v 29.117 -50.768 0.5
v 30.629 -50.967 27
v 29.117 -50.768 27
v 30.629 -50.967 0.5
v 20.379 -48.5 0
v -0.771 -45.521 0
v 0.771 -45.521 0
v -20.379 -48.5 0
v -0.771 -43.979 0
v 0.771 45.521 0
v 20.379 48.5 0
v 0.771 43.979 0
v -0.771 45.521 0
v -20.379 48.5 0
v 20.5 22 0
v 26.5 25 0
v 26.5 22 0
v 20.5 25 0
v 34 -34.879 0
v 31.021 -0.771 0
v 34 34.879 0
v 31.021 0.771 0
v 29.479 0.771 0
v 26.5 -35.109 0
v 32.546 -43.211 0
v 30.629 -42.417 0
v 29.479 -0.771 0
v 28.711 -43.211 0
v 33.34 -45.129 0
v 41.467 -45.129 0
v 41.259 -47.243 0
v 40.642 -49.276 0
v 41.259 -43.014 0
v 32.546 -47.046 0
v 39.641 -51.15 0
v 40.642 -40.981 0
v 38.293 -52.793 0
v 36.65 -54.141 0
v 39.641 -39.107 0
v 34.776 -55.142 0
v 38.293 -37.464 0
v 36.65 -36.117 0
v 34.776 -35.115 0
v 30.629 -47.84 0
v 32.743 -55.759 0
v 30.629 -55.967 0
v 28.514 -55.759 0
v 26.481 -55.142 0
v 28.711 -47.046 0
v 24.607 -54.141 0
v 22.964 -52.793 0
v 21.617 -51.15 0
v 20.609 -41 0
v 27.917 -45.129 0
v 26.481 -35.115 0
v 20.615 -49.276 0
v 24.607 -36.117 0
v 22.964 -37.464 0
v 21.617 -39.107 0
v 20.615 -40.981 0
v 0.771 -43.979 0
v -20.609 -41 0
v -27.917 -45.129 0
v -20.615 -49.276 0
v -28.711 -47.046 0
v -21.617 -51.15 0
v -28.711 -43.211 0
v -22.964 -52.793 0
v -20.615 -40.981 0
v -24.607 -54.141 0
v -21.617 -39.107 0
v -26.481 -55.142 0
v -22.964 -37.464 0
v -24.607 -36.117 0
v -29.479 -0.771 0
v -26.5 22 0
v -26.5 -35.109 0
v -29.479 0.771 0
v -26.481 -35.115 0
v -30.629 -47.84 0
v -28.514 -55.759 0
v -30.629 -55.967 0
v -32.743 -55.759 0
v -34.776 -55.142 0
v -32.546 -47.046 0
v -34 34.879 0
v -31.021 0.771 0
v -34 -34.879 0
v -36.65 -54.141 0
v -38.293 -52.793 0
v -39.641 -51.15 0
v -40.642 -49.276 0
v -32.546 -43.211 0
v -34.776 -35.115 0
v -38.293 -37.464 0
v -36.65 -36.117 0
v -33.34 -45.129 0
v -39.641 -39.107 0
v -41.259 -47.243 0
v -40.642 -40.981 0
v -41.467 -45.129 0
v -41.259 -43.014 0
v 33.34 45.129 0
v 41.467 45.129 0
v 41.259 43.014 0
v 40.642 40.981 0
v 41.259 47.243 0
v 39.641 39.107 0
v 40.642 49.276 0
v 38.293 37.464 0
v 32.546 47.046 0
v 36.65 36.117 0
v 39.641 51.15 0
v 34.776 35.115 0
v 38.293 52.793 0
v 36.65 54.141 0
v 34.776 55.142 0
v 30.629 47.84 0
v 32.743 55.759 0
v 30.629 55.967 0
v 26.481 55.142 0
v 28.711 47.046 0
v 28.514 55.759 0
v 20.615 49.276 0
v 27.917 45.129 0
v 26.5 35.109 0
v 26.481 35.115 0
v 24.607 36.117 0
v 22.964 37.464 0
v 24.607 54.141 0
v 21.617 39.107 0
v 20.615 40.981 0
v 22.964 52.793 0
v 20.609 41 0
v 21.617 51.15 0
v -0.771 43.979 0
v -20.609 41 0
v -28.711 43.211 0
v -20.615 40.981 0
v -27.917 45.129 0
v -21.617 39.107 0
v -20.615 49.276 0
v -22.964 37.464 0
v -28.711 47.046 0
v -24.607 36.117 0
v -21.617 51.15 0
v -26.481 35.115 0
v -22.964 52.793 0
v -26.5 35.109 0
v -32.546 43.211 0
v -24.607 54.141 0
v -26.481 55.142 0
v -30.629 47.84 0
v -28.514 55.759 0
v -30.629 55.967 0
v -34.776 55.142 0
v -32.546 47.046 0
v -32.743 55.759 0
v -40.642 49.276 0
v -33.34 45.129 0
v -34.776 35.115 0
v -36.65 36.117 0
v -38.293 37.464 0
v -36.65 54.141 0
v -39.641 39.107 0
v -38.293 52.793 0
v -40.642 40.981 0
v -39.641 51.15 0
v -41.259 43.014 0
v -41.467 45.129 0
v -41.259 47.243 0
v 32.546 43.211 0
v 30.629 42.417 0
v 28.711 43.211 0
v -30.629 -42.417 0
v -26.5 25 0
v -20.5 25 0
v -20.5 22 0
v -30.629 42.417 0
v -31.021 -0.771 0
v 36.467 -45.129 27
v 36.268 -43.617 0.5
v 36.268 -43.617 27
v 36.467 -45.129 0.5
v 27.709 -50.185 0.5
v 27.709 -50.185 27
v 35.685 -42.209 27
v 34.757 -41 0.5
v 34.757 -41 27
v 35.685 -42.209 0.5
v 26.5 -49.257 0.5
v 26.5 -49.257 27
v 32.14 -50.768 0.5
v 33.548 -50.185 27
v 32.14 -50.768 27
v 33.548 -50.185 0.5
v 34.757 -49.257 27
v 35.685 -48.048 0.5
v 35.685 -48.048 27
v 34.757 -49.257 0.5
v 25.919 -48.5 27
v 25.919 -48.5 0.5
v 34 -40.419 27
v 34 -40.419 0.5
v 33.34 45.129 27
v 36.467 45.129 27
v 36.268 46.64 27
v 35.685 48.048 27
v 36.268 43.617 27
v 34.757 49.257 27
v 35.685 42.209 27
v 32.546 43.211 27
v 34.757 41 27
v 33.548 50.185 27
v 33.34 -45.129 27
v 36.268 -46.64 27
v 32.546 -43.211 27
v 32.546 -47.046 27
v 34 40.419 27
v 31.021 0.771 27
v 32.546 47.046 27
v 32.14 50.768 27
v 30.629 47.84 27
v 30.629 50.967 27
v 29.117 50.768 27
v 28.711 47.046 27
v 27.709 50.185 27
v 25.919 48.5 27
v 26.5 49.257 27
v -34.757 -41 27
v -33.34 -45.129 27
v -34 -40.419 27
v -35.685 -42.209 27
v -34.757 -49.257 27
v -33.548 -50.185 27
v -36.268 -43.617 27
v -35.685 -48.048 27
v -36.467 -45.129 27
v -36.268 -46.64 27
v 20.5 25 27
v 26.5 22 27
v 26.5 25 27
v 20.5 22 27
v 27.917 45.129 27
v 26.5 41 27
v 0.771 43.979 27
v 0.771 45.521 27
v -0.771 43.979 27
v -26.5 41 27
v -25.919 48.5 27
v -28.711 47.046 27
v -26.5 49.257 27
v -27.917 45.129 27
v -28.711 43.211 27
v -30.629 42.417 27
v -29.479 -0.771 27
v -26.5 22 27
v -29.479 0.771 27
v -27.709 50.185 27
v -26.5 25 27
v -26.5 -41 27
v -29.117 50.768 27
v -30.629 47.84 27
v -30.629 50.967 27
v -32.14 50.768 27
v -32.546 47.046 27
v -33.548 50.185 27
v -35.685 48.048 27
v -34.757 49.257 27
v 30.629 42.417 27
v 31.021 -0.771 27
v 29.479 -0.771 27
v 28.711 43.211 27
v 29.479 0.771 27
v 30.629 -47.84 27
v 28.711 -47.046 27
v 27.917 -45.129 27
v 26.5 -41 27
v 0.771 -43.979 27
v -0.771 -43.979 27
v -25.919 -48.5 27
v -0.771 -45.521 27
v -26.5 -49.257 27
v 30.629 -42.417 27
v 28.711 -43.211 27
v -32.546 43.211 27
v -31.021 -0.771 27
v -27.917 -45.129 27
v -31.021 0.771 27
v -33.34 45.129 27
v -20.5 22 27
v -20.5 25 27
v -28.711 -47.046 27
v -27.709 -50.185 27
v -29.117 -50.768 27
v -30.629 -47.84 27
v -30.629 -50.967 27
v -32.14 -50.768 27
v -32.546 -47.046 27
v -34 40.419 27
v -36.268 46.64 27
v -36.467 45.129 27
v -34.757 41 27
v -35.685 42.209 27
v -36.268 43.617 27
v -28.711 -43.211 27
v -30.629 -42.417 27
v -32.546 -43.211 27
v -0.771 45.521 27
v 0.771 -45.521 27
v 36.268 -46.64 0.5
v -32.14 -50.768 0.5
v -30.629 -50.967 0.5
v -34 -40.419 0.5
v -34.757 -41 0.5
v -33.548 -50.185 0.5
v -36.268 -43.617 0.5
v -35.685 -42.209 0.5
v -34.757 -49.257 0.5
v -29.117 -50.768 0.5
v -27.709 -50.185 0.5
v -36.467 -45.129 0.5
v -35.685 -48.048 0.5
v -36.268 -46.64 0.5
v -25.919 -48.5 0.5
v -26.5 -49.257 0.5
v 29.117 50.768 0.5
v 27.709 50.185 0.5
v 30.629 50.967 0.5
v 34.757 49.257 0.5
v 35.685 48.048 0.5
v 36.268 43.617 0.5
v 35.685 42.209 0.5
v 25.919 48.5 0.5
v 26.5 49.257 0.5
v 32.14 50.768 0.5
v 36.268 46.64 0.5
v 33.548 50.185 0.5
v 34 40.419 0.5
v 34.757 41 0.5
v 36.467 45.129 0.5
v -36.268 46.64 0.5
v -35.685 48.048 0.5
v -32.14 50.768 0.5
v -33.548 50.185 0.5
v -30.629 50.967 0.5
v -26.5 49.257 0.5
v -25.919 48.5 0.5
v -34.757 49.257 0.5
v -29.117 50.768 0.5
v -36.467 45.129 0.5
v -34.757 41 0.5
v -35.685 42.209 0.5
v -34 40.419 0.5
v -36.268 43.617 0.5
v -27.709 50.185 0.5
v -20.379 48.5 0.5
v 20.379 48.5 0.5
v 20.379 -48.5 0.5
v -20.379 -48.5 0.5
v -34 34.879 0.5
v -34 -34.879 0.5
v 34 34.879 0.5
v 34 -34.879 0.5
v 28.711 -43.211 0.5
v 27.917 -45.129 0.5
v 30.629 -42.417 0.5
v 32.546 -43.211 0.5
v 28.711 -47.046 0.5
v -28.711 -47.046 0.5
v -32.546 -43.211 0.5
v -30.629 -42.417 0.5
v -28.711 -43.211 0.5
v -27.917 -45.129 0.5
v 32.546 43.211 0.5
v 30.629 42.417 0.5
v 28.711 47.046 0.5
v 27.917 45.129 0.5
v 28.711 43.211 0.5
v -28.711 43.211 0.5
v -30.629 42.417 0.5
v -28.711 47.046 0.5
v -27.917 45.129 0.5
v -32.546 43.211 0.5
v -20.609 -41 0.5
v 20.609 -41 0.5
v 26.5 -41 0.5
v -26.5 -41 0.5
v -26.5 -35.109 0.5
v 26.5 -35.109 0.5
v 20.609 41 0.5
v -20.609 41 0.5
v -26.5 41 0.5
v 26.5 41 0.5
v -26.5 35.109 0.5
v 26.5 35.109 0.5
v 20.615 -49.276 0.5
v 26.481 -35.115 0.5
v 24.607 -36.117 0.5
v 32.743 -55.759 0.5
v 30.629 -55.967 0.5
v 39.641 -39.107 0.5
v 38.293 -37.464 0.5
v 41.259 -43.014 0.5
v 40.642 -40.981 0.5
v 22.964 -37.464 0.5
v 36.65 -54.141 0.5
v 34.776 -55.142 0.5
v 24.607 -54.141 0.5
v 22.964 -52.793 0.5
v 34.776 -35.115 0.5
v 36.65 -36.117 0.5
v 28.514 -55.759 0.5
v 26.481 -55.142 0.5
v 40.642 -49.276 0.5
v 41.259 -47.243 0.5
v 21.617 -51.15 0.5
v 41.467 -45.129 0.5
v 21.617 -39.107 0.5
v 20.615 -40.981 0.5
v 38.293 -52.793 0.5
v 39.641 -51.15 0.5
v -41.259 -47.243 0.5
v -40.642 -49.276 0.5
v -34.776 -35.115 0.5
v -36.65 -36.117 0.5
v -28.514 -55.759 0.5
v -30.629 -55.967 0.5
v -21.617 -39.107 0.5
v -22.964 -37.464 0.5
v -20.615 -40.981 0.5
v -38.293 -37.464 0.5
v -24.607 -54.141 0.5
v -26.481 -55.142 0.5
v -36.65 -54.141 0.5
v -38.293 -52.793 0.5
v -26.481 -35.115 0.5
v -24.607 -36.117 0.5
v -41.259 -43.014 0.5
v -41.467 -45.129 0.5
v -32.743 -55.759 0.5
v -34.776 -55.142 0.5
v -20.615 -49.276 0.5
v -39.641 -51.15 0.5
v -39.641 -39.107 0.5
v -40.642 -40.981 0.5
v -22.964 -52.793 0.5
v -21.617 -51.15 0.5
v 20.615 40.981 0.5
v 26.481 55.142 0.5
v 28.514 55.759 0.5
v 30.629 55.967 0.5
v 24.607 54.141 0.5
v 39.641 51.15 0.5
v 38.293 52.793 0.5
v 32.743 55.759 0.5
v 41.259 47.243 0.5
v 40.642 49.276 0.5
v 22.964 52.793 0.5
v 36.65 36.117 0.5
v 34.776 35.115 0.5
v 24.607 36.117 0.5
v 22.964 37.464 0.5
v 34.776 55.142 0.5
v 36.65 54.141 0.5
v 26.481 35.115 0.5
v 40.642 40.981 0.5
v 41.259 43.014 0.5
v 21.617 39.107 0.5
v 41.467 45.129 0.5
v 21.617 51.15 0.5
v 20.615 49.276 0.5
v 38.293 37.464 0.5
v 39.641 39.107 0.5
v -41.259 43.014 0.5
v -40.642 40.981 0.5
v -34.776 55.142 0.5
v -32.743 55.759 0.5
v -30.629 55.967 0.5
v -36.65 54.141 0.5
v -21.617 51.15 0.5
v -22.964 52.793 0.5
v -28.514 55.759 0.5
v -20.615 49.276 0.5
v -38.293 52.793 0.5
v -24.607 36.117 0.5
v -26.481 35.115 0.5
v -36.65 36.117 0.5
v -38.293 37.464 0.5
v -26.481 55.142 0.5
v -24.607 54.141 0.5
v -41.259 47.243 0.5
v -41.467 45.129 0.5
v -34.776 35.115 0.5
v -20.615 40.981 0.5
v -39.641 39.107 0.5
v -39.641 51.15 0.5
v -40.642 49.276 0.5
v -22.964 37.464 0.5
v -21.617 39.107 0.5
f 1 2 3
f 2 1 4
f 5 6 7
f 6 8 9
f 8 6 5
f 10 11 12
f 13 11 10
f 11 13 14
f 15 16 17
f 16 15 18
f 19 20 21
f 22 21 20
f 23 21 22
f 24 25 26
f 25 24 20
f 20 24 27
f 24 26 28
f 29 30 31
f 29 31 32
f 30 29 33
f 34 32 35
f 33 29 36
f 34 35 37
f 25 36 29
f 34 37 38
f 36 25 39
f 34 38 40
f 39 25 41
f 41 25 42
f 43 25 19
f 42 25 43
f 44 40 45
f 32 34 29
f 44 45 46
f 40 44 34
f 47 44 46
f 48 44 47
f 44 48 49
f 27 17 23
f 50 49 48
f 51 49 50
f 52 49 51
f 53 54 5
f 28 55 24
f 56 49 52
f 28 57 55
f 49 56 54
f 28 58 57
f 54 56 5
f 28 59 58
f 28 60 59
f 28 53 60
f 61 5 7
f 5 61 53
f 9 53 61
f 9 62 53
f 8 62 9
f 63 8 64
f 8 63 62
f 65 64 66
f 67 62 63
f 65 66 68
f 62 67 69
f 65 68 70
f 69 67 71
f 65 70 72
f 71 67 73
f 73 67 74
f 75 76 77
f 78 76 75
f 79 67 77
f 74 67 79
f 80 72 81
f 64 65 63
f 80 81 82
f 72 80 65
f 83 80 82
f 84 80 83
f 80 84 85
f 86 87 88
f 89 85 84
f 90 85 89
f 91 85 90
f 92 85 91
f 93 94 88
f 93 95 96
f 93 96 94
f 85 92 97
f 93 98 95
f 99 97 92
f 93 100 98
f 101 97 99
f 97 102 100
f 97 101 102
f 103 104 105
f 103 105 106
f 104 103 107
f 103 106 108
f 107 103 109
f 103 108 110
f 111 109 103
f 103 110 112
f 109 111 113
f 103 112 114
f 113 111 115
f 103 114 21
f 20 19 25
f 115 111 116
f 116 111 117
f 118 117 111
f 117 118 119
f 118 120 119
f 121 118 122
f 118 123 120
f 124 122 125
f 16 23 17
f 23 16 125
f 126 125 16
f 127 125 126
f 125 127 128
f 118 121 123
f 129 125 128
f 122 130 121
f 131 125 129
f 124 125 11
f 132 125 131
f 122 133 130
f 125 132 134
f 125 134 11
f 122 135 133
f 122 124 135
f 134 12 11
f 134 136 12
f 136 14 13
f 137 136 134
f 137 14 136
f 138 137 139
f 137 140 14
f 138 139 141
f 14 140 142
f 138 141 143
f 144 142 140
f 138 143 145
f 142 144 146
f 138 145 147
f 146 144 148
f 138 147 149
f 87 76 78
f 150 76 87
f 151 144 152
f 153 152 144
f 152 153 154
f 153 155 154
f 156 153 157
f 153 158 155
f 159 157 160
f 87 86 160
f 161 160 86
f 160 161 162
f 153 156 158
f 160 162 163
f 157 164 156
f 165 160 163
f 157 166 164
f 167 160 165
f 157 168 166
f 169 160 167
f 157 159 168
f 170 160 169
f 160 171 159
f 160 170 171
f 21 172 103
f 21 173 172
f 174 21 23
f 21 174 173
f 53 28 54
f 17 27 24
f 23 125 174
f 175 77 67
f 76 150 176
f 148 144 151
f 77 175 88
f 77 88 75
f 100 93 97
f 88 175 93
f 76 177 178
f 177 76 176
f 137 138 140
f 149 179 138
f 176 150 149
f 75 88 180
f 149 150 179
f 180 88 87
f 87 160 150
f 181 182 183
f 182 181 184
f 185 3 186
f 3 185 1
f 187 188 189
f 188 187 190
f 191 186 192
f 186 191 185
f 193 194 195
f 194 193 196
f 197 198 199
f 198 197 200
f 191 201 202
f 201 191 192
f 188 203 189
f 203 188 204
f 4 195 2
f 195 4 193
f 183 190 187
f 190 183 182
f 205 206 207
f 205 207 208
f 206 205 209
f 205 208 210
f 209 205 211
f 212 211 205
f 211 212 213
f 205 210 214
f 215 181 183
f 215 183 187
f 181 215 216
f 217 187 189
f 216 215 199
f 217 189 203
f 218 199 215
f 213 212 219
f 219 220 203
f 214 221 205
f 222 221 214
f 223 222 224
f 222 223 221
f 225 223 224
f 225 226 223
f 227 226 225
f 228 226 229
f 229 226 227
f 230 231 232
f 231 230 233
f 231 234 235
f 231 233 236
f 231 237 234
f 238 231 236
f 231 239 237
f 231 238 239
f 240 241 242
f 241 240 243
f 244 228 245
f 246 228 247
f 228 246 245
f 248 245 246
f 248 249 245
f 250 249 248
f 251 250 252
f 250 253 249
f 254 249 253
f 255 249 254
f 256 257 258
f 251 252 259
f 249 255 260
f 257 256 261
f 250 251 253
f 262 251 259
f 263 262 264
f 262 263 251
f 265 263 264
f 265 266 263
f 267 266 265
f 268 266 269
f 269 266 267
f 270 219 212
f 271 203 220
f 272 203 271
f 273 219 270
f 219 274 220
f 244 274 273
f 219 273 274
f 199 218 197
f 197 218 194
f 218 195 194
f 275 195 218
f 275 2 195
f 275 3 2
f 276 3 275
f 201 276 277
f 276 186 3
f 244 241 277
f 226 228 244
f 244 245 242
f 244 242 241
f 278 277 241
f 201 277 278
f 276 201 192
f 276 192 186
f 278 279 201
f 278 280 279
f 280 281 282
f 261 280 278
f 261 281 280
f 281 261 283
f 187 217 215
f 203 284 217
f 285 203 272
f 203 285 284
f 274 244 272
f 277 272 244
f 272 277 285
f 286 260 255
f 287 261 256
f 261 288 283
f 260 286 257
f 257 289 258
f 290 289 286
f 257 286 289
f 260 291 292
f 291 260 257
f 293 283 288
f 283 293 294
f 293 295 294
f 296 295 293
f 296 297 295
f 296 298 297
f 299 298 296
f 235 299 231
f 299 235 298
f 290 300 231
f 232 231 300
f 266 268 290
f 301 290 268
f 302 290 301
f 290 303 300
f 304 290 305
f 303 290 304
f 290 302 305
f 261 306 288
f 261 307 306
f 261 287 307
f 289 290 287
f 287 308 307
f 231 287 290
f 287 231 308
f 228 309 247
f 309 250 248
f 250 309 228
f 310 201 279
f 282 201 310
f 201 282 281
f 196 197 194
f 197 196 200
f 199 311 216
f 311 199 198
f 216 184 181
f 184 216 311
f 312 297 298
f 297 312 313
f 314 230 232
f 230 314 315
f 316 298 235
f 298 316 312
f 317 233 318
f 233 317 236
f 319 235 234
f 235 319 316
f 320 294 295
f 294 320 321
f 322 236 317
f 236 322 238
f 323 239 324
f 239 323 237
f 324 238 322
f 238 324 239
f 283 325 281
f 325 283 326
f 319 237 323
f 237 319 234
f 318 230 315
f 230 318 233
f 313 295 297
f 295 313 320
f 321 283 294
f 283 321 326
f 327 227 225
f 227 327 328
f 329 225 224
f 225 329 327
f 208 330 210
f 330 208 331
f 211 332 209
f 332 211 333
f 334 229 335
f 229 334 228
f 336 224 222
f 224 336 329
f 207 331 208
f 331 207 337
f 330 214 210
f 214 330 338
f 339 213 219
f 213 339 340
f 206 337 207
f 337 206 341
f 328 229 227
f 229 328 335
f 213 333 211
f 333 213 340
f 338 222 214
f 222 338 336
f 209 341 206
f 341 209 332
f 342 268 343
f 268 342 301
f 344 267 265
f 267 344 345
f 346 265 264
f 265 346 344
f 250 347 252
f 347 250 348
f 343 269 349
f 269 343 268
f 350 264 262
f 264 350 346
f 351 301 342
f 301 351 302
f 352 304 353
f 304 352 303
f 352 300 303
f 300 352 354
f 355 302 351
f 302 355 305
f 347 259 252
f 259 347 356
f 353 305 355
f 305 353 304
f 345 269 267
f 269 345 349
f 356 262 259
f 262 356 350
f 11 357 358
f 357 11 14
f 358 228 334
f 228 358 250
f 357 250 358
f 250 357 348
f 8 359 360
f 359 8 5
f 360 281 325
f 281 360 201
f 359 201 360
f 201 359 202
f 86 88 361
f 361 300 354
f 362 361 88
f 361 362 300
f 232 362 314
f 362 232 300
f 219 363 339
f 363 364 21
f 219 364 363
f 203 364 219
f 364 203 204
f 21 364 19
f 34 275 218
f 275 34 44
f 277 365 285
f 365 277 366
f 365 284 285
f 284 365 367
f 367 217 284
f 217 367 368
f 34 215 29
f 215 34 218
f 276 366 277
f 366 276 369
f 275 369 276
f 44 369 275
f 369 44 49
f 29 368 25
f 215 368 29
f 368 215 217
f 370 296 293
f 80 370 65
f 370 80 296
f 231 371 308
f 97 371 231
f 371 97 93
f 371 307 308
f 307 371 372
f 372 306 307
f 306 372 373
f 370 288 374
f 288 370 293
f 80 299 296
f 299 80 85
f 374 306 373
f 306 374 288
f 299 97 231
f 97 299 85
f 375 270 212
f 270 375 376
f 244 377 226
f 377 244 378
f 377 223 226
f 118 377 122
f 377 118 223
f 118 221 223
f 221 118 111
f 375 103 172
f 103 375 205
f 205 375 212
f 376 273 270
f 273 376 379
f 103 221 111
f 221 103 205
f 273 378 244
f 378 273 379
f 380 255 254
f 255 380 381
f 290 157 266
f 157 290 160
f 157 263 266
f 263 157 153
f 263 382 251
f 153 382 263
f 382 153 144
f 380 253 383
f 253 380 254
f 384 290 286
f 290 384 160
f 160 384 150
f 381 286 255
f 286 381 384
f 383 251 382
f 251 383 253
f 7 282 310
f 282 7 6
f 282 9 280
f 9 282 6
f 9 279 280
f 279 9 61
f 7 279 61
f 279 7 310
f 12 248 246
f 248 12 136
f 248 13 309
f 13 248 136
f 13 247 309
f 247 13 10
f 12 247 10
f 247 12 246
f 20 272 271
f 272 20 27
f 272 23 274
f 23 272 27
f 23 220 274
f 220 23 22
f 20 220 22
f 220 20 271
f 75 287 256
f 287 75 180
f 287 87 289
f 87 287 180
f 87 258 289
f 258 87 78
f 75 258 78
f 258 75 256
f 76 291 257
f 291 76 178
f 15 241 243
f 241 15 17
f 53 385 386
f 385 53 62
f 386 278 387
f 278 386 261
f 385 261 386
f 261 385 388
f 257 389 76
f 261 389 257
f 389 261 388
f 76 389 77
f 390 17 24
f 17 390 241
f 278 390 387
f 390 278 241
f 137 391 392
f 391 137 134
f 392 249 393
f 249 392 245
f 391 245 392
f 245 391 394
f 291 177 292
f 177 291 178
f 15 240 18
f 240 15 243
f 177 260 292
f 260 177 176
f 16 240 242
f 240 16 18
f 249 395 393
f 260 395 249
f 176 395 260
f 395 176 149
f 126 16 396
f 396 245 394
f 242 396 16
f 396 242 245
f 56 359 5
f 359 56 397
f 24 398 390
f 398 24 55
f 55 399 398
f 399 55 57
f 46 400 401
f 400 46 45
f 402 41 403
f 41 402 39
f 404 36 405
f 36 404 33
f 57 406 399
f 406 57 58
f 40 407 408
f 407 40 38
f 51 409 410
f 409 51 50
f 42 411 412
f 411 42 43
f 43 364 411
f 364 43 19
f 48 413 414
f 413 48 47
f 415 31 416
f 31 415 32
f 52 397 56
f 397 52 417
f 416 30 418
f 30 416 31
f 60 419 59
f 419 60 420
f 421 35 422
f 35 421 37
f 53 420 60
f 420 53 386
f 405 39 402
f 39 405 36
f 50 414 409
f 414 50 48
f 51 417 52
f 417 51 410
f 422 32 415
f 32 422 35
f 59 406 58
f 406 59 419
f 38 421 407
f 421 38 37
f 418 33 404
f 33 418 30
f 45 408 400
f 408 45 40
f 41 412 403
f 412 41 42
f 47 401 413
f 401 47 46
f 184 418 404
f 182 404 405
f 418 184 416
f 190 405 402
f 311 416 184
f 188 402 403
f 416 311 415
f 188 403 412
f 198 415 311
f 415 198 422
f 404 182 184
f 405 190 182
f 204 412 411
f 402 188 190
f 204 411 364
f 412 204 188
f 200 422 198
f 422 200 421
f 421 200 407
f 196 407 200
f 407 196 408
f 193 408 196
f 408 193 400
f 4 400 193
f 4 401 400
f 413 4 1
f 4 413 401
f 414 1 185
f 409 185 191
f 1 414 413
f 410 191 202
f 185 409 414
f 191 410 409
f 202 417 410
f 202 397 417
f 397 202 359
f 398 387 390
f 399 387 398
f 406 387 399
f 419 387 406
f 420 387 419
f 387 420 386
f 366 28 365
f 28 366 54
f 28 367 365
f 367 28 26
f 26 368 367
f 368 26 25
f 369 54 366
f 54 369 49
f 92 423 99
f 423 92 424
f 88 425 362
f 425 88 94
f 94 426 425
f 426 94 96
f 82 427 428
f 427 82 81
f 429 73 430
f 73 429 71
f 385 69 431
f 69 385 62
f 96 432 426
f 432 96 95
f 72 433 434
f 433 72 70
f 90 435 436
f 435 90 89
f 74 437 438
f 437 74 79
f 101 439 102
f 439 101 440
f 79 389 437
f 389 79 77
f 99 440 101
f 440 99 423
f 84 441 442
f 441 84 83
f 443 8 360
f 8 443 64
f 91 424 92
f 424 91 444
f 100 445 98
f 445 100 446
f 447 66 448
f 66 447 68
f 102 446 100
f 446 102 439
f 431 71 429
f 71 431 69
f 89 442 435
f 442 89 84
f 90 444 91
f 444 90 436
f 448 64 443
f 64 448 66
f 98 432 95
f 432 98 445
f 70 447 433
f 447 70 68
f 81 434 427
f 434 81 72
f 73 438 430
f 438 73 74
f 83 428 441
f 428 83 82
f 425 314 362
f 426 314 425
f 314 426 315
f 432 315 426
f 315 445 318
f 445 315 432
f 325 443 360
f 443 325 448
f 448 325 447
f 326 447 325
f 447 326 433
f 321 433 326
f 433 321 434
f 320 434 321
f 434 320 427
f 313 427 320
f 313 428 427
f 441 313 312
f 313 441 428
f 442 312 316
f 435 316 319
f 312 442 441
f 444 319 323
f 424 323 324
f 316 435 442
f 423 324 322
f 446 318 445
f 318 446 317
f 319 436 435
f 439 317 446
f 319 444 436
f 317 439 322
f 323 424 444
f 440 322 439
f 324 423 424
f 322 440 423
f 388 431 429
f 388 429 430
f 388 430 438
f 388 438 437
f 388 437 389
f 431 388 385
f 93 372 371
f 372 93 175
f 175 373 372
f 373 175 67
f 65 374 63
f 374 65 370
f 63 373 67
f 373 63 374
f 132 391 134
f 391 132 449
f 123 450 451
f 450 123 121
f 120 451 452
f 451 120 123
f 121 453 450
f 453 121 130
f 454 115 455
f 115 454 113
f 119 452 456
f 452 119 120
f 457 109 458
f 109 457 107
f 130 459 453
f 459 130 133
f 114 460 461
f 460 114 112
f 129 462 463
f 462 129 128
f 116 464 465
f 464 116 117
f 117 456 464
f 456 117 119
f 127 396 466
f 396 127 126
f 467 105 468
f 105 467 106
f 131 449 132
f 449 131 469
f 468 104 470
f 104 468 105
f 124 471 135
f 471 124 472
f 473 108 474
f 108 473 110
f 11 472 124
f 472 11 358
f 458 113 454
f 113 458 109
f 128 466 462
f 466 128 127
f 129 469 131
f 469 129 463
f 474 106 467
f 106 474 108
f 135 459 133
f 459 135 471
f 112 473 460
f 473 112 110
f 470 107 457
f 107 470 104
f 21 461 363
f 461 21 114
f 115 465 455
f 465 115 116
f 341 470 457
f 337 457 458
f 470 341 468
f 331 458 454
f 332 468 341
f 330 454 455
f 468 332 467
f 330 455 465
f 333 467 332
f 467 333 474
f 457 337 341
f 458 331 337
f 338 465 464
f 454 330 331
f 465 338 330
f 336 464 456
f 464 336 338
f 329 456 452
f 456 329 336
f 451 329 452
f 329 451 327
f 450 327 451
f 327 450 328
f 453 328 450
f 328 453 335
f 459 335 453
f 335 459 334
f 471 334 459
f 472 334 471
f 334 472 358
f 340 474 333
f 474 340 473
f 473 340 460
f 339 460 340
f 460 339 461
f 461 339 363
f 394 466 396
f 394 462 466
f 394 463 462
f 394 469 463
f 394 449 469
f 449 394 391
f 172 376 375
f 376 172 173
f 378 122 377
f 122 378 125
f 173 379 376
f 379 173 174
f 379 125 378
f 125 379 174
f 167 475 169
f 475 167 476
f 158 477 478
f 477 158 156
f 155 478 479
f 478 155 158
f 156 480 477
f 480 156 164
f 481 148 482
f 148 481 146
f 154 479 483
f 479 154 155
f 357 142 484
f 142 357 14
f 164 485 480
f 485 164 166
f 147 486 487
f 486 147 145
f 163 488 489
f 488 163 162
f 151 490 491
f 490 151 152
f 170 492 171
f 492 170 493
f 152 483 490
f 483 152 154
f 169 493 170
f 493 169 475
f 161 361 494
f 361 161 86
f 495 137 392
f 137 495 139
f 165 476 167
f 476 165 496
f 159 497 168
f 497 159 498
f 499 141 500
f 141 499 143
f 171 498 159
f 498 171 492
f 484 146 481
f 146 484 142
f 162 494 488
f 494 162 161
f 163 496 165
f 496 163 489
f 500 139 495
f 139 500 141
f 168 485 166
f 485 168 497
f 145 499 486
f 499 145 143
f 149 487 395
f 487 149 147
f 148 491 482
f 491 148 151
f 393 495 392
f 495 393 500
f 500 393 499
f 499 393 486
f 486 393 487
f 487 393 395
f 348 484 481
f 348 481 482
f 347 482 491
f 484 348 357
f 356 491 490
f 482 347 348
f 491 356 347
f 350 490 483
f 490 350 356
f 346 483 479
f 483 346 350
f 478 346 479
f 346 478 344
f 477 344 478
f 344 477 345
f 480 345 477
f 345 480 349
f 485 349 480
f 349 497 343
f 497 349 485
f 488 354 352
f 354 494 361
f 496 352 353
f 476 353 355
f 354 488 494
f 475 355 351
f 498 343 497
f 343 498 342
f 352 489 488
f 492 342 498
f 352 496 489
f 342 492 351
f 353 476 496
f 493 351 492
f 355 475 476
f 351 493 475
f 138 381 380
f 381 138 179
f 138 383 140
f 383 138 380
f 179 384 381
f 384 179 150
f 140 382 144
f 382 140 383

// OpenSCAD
// Longboard Ground Effect Lighting Controller Case
// Ed Nisley KE4ZNU
// Karen Nisley KC2SYU
// October 2012

// Layout options

Layout = "Build1";
					// Overall layout: Fit Show
					// Printing plates: Build1 .. Buildn (see bottom!)
					// Parts: BatteryLayer PCBLayer1 PCBLayer2
					// Shapes: CaseShell PCBEnvelope

ShowGap = 5;		// spacing between parts in Show layout

//-----
// Extrusion parameters must match reality!

ThreadThick = 0.25;
ThreadWidth = 2.0 * ThreadThick;

HoleWindage = 0.2;

//-- Handy stuff

function IntegerMultiple(Size,Unit) = Unit * ceil(Size / Unit);

Protrusion = 0.1;			// make holes end cleanly

inch = 25.4;

Tap10_32 = 0.159 * inch;
Clear10_32 = 0.190 * inch;
Head10_32 = 0.373 * inch;
Head10_32Thick = 0.110 * inch;
Nut10_32Dia = 0.433 * inch;
Nut10_32Thick = 0.130 * inch;
Washer10_32OD = 0.381 * inch;
Washer10_32ID = 0.204 * inch;

//----------------------
// Dimensions

FlangeWidth = IntegerMultiple(5.0,ThreadWidth);
FlangeThick = 2*ThreadThick;

CellWidth = 50.0;						// Lithium-ion cell dimensions
CellLength = 60.0;
CellThick = 6.0;
CellClearance = 1.5;					// on all sides
CellTabClearance = 15.0;				// for connections

CellHoldWidth = 6.0;					// edge to tabs
CellHoldLength = 4*ThreadWidth;

CellCount = 4;						// cells in the battery

BatteryHeight = CellCount*CellThick + 2*CellClearance;
BatteryLength = CellLength + 2*CellClearance;
BatteryWidth = CellWidth + 2*CellClearance;

PCMWidth = 16.0;						// Battery protection module
PCMLength = 51.0;
PCMThick = 4.0;							// at terminal end of cells

PillarOD = Washer10_32OD + 2*1.0;		// screw pillar diameter
PillarOffset = (PillarOD/2) / sqrt(2.0);	// distance to case inside corner

WallThick = 7.5;						// case wall thickness

PinOD = 1.4;							// alignment pin size

CaseInsideLength = BatteryLength + CellTabClearance + PCMThick;
CaseOALength = CaseInsideLength + 2*WallThick;
echo("Box Length outside: ",CaseOALength);
echo("            inside: ",CaseInsideLength);

WiringLength = CaseInsideLength - CellLength - CellHoldLength - PCMThick;	// wiring space at PCM
echo("Wiring length: ",WiringLength);

CaseInsideWidth = BatteryWidth;
CaseOAWidth = CaseInsideWidth + 2*WallThick;
echo("Box Width outside: ",CaseOAWidth);
echo("           inside: ",CaseInsideWidth);
echo("Screw OC length: ",CaseInsideLength + 2*PillarOffset);
echo("          width: ",CaseInsideWidth + 2*PillarOffset);

PCBThick = 2.0;							// PCB thickness
PCBMargin = 3.0;						// clamping margin around PCB edge
PartHeight = 17.0;						// height of components above PCB (mind the switch!)
WiringThick = 5.0;						// wiring below PCB

echo("PCB thickness:",PCBThick);
echo("    clamp margin: ",PCBMargin);
echo("    wiring: ",WiringThick);
echo("    components: ",PartHeight);

PCBLayer1Thick = IntegerMultiple(WiringThick + PCBThick/2,ThreadThick);
PCBLayer2Thick = IntegerMultiple(PartHeight + PCBThick/2,ThreadThick);

echo("Battery compartment height: ",BatteryHeight);
echo("PCB Layer 1 height: ",PCBLayer1Thick);
echo("PCB Layer 2 height: ",PCBLayer2Thick);

PlateThick = 1/16 * inch;				// aluminum mount / armor plates

echo("Total height: ",2*PlateThick + BatteryHeight + PCBLayer1Thick + PCBLayer2Thick);

ChargePlugOD = 11.5;					// battery charger plug
ChargeJackHeightOC = 6.5;				// coaxial jack center pin height from PCB

SwitchLength = 20.0;					// master power switch
SwitchWidth = 13.0;

WheelCableOD = 3.0;						// 3-conductor from wheel rotation sensor

LEDCableWidth = 10.0;					// 6 conductor loose wires to LED strips
LEDCableThick = 2.0;

//----------------------
// Useful routines

module PolyCyl(Dia,Height,ForceSides=0) {			// based on nophead's polyholes

  Sides = (ForceSides != 0) ? ForceSides : (ceil(Dia) + 2);

  FixDia = Dia / cos(180/Sides);

  cylinder(r=(FixDia + HoleWindage)/2,
           h=Height,
	   $fn=Sides);
}

module ShowPegGrid(Space = 10.0,Size = 1.0) {

  Range = floor(50 / Space);

	for (x=[-Range:Range])
	  for (y=[-Range:Range])
		translate([x*Space,y*Space,Size/2])
		  %cube(Size,center=true);

}


//-------------------
// Shapes

module CaseShell(h=1.0) {

  difference() {
	union() {
	  translate([0,0,h/2])
		cube([CaseOALength,CaseOAWidth,h],center=true);

	  for (x=[-1,1])
		for (y=[-1,1])
		  translate([x*(PillarOffset + CaseInsideLength/2),
					y*(PillarOffset + CaseInsideWidth/2),
					h/2])
			cylinder(r=PillarOD/2,h,center=true,$fn=4*6);
	}

	for (x=[-1,1])					// screw holes on corners
	  for (y=[-1,1])
		translate([x*(PillarOffset + CaseInsideLength/2),
				  y*(PillarOffset + CaseInsideWidth/2),
				  -Protrusion])
		  PolyCyl(Clear10_32,(h + 2*Protrusion),8);

	for (x=[-1,1])					// alignment pins in width walls
	  translate([x*(CaseOALength - WallThick)/2,0,-Protrusion])
	  rotate(45)
		  PolyCyl(PinOD,(h + 2*Protrusion));
	for (y=[-1,1])					// alignment pins in length walls
	  translate([0,y*(CaseOAWidth - WallThick)/2,-Protrusion])
	  rotate(45)
		  PolyCyl(PinOD,(h + 2*Protrusion));

  }
}

module BatteryLayer() {

  difference() {
	CaseShell(BatteryHeight);

    translate([0,0,BatteryHeight/2]) {
	  union() {
		translate([-(CaseInsideLength/2 - BatteryLength/2),0,0])
		  cube([BatteryLength,
			   BatteryWidth,
			   BatteryHeight + 2*Protrusion],
			   center=true);
		cube([CaseInsideLength,
			 (BatteryWidth - 2*CellHoldWidth),
			 BatteryHeight + 2*Protrusion],
			 center = true);
		translate([(CaseInsideLength/2 - WiringLength/2),0,0])
		  cube([WiringLength,
				max(BatteryWidth,PCMLength),
				BatteryHeight + 2*Protrusion],
				  center=true);
	  }
	}
  }
}

module PCBEnvelope() {

  union() {
	translate([0,0,WiringThick + PCBThick + PartHeight/2])
	  cube([CaseInsideLength - 2*PCBMargin,
		   CaseInsideWidth - 2*PCBMargin,
		   PartHeight + 2*Protrusion],
		   center=true);

	translate([0,0,WiringThick + PCBThick/2])
	  cube([CaseInsideLength,CaseInsideWidth,PCBThick],center=true);

	translate([0,0,WiringThick/2])
	  cube([CaseInsideLength - 2*PCBMargin,
		   CaseInsideWidth - 2*PCBMargin,
		   WiringThick + 2*Protrusion],
		   center=true);
  }
}

module PCBLayer1() {

  difference() {
	CaseShell(PCBLayer1Thick);
	PCBEnvelope();
  }

}

module PCBLayer2() {

  difference() {
	CaseShell(PCBLayer2Thick);
	translate([0,0,-(WiringThick + PCBThick/2)])
	  PCBEnvelope();
	translate([25,0,(PCBThick/2 + ChargeJackHeightOC)])
	  rotate([90,0,0])
		PolyCyl(ChargePlugOD,CaseOAWidth);
	translate([25,CaseOAWidth/2,PCBLayer2Thick/2])
	  rotate([90,0,0])
		cube([SwitchLength,SwitchWidth,CaseOAWidth],center=true);
	translate([-CaseOALength/2,0,PCBThick/2])
	  rotate([0,-90,0])
		cube([2*WheelCableOD,WheelCableOD,CaseOALength],center=true);
	translate([CaseOALength/2,0,PCBThick/2])
	  rotate([90,0,90])
		cube([LEDCableWidth,2*LEDCableThick,CaseOALength],center=true);
  }

}

module Aluminum() {
  translate([0,0,PlateThick/2])
	cube([1.1*CaseOALength,1.1*CaseOAWidth,PlateThick - Protrusion],center=true);
}

module MouseEars() {
  
  for (x=[-1,1])
	for (y=[-1,1])
	  translate([x*(PillarOffset + CaseInsideLength/2),
				y*(PillarOffset + CaseInsideWidth/2),
				FlangeThick/2])
		difference() {
		  cylinder(r=(PillarOD/2 + FlangeWidth),FlangeThick,center=true,$fn=8*4);
		  translate([0,0,-FlangeThick/2 - Protrusion])
			PolyCyl(Clear10_32,(FlangeThick + 2*Protrusion),8);
		}  
}



//-------------------
// Build things...

ShowPegGrid();

if ("Battery" == Layout)
  Battery();

//if ("CaseShell" == Layout)
//  CaseShell(something here!!!);

if ("BatteryLayer" == Layout)
  BatteryLayer();

if ("PCBEnvelope" == Layout)
  PCBEnvelope();

if ("PCBLayer1" == Layout)
  PCBLayer1();

if ("PCBLayer2" == Layout)
  PCBLayer2();

if ("Fit" == Layout) {
  color("LightBlue") BatteryLayer();
  translate([0,0,BatteryHeight + PlateThick])
	color("Green") PCBLayer1();
  translate([0,0,BatteryHeight + PlateThick + PCBLayer1Thick])
	color("Cyan") PCBLayer2();
}

if ("Show" == Layout) {
  color("LightBlue") BatteryLayer();
  translate([0,0,BatteryHeight + PlateThick + ShowGap])
	color("Green") PCBLayer1();
  translate([0,0,BatteryHeight + PlateThick + PCBLayer1Thick + 2*ShowGap])
	color("Cyan") PCBLayer2();
}

if ("Build1" == Layout)
  rotate(90) {
	BatteryLayer();
	MouseEars();
  }

if ("Build2" == Layout)
  rotate(90) {
	PCBLayer1();
	MouseEars();
  }

if ("Build3" == Layout) {
  translate([0,0,PCBLayer2Thick])
	rotate([0,180,90])
	  PCBLayer2();
  rotate(90) MouseEars();
}
